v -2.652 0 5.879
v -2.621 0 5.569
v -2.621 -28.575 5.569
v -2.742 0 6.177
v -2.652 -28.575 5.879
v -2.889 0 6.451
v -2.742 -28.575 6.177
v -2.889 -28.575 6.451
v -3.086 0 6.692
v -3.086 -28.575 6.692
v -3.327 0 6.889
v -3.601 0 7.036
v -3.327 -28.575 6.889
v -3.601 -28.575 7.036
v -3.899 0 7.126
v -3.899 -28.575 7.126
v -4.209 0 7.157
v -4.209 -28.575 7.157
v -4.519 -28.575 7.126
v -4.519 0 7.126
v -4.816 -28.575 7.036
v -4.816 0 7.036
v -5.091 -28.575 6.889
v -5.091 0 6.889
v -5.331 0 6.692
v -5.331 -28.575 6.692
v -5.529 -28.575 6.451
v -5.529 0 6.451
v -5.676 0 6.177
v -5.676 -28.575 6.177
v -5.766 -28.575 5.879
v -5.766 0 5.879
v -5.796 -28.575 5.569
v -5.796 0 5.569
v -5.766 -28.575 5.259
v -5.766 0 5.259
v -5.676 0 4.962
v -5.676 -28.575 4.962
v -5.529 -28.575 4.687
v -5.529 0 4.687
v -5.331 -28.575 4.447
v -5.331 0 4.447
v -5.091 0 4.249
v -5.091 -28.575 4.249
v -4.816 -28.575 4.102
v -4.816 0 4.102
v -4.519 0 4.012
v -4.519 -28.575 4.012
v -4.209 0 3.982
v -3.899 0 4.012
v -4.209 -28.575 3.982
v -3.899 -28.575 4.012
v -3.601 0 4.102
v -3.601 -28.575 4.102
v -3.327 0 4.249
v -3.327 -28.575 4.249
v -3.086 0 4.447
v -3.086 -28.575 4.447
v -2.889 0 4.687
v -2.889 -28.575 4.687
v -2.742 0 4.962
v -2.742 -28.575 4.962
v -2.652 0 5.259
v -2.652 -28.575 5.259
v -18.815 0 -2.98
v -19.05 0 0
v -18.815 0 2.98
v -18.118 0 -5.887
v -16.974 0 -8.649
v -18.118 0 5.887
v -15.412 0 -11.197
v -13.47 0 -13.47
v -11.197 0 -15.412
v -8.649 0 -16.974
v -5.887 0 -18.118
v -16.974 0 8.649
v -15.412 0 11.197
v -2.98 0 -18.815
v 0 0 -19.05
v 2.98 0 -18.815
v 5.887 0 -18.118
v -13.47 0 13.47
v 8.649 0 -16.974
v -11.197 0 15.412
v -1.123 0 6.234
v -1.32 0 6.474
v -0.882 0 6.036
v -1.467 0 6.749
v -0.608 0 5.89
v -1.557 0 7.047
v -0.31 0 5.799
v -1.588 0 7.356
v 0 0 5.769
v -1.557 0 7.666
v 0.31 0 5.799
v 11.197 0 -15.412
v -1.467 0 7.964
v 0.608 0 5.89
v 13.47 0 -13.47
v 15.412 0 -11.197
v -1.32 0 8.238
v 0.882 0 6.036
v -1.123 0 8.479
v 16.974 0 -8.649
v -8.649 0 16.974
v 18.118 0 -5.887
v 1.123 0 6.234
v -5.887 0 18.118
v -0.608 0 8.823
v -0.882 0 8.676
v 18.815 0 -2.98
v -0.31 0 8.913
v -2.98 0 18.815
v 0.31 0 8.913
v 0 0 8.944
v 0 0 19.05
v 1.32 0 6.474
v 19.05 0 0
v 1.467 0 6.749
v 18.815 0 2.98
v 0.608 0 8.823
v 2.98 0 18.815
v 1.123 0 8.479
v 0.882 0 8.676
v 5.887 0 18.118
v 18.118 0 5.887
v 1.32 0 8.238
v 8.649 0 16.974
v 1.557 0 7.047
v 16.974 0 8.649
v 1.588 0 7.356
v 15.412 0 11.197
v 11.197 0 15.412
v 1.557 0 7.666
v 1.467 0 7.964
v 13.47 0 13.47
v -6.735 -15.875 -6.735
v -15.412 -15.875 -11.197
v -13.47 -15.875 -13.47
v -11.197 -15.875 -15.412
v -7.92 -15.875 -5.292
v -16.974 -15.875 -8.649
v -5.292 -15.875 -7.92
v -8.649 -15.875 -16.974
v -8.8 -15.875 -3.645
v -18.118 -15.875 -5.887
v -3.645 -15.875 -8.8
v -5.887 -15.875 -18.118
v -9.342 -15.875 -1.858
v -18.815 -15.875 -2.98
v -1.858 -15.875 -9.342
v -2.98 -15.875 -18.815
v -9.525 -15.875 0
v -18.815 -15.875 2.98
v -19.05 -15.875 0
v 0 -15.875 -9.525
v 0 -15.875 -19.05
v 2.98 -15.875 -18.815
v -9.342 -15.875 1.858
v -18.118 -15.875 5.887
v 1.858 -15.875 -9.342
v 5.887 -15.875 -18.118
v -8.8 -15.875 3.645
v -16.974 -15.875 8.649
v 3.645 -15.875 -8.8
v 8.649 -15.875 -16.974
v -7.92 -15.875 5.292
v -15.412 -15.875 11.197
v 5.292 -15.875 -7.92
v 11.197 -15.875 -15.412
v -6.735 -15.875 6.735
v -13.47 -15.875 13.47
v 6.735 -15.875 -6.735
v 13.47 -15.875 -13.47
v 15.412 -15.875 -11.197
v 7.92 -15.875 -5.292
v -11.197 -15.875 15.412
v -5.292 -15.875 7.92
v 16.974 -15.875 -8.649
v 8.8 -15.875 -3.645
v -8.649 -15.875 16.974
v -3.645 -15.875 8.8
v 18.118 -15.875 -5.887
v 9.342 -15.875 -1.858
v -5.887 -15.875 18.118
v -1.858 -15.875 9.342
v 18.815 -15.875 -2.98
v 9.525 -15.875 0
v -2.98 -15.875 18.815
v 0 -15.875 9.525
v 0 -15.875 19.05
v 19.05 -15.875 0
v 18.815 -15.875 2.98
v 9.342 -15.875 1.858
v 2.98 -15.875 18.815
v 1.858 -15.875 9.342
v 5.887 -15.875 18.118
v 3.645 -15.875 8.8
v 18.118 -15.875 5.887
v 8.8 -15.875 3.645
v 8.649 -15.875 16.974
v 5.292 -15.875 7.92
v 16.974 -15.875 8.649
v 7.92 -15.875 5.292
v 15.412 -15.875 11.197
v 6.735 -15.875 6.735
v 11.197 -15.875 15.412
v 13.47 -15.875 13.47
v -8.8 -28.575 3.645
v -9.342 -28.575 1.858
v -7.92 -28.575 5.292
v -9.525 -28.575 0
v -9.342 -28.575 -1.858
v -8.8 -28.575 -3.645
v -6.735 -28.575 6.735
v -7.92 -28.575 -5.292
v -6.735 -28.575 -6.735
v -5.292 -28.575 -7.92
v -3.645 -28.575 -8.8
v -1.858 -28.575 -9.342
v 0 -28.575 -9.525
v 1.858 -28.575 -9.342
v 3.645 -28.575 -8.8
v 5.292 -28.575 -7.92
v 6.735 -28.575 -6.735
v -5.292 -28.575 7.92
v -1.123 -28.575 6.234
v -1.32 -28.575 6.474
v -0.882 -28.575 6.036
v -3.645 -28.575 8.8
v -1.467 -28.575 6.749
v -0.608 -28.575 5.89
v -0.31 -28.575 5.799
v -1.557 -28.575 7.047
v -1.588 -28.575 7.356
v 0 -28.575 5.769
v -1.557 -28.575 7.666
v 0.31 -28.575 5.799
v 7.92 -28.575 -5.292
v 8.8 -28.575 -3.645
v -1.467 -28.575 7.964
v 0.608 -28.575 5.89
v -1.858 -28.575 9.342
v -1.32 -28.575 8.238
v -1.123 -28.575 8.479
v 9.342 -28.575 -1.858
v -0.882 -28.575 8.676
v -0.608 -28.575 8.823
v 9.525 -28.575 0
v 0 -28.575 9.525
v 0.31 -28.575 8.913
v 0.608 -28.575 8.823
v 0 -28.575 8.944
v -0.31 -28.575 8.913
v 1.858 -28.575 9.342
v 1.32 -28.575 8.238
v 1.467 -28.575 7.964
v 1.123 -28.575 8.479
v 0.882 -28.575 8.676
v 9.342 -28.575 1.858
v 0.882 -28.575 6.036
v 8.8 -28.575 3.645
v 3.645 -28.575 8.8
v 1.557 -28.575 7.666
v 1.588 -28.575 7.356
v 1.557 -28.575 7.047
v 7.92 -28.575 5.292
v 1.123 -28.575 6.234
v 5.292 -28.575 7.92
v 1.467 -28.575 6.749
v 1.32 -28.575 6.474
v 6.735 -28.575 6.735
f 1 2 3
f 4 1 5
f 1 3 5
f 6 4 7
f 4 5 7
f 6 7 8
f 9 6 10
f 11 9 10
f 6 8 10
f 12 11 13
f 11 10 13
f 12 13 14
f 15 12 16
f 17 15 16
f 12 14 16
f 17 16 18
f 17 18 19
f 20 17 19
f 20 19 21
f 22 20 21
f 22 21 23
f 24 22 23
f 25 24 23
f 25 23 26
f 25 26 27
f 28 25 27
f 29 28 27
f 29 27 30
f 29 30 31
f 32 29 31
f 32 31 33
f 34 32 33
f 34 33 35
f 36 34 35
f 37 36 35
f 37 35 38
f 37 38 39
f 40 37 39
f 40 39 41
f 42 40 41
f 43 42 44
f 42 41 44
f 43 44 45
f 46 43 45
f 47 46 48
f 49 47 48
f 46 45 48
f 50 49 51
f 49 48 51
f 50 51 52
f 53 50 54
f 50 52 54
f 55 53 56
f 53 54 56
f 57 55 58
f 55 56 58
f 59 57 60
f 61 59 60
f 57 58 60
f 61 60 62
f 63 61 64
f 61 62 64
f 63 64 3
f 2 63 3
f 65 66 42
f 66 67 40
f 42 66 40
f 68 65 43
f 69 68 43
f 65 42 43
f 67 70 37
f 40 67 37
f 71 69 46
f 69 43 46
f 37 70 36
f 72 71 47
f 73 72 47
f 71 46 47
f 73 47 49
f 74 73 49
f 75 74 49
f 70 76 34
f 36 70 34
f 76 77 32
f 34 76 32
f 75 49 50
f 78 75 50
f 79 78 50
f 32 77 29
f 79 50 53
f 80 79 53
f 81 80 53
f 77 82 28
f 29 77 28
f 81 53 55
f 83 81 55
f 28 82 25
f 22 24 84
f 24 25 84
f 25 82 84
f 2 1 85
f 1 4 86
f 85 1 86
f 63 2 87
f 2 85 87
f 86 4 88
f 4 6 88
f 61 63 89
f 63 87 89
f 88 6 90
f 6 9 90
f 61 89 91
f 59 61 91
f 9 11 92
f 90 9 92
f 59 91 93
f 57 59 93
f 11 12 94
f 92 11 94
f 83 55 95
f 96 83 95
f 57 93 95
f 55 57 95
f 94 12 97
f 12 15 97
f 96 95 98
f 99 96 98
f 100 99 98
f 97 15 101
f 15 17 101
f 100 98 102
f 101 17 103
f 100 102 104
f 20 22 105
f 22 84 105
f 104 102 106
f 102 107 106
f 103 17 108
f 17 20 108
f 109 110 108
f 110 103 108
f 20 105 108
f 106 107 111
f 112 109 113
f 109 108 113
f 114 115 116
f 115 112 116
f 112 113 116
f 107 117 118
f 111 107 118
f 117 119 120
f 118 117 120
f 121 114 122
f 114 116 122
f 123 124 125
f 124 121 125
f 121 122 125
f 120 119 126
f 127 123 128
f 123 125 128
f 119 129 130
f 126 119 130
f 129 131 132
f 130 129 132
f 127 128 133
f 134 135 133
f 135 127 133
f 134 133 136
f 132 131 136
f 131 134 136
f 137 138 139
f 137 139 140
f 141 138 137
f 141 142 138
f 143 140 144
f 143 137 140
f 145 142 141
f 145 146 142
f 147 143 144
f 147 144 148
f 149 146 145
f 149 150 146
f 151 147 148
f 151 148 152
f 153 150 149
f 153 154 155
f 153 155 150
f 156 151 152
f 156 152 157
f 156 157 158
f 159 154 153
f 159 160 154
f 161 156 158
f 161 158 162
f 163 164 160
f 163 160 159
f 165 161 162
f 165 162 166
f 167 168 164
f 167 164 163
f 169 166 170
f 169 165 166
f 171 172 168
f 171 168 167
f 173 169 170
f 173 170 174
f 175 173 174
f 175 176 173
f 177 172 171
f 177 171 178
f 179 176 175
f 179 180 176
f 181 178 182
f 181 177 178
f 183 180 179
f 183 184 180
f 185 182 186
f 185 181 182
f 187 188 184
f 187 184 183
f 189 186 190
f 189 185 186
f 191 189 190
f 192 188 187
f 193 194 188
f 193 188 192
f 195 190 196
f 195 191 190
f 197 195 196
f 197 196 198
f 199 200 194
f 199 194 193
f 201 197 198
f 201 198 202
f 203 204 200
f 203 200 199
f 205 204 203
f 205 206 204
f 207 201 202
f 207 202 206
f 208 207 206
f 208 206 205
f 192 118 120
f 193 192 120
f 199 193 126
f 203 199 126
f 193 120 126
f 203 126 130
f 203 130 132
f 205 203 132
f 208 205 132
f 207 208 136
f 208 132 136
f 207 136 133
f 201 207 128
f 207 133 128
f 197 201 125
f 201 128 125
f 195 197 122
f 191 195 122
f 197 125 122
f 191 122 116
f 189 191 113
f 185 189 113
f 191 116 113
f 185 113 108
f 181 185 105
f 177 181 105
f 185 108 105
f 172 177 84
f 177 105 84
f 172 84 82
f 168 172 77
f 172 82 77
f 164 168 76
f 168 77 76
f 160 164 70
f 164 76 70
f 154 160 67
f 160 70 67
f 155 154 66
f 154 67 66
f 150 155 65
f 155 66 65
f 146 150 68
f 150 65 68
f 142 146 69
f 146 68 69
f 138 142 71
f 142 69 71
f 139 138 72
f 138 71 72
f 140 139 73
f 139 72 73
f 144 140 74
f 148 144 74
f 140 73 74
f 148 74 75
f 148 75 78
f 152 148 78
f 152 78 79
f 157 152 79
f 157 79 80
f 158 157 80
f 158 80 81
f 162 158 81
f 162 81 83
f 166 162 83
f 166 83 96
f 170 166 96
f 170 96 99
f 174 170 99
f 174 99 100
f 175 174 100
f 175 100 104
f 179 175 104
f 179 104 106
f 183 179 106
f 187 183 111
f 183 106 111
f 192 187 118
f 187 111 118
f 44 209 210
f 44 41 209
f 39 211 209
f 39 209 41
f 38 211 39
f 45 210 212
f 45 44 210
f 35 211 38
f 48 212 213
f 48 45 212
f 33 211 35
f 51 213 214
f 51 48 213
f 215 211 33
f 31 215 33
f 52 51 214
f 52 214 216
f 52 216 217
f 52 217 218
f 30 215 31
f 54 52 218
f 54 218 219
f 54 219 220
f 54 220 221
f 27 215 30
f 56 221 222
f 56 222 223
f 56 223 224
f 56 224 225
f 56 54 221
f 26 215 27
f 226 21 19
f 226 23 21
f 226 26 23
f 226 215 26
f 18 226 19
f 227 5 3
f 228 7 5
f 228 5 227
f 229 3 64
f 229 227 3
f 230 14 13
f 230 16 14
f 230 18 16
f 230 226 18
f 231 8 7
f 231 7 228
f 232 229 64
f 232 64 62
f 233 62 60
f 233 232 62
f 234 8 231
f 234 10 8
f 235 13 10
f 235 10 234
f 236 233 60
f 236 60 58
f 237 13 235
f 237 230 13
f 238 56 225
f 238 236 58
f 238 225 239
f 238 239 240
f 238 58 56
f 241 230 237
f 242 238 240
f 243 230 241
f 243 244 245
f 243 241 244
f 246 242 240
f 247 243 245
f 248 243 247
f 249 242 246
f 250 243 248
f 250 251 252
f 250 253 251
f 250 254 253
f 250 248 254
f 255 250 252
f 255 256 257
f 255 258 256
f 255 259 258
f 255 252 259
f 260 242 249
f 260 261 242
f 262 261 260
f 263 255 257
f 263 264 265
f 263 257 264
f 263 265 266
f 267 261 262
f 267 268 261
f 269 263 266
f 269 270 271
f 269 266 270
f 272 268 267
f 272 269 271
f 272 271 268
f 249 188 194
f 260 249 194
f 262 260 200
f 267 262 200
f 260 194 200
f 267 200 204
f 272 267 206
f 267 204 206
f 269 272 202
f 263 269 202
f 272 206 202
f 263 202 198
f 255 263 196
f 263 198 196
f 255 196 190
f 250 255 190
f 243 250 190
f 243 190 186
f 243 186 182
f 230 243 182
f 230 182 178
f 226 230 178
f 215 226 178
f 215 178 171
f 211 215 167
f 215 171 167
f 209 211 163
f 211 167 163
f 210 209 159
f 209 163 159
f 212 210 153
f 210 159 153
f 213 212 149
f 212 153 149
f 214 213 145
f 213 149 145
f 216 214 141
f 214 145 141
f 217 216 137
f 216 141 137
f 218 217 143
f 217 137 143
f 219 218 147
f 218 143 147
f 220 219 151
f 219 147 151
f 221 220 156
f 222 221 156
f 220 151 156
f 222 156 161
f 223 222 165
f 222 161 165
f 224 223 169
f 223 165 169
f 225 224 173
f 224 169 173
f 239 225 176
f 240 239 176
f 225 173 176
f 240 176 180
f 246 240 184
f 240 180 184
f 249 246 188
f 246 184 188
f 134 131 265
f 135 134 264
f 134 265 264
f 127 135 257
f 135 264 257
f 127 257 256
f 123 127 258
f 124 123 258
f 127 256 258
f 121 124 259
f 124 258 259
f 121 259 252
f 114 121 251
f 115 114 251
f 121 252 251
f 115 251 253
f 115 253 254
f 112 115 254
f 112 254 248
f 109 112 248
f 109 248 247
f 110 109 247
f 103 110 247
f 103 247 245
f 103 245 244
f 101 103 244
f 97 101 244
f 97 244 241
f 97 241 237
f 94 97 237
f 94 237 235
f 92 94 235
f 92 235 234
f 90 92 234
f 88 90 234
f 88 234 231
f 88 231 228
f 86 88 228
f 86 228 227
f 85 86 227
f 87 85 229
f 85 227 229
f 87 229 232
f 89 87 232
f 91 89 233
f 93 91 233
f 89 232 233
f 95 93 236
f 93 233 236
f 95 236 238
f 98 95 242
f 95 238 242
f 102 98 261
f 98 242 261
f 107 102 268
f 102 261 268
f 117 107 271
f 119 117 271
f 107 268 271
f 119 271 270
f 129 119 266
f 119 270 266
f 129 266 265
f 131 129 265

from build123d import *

# Parameters (mm, degrees)
F0_R     = 19.05
F1_DEPTH = 15.875
F2_R     = 9.525
F3_DEPTH = 12.7
F4_R     = 1.5875
F5_DEPTH = 50.8
F6_R     = 1.5875
F7_DEPTH = 50.8


with BuildPart() as f1:
    # F0 (on Front) → F1 (new body)
    with BuildSketch(Plane.XZ):
        Circle(F0_R)
    extrude(amount=F1_DEPTH)

    # F2 (on face) → F3 (join)
    with BuildSketch(Plane.XZ.offset(15.875)):
        Circle(F2_R)
    extrude(amount=F3_DEPTH)

    # F4 (on face) → F5 (cut)
    with BuildSketch(Plane.XZ.offset(28.575)):
        with Locations((0, 7.356282)):
            Circle(F4_R)
    extrude(amount=-F5_DEPTH, mode=Mode.SUBTRACT)

    # F6 (on face) → F7 (cut)
    with BuildSketch(Plane.XZ.offset(28.575)):
        with Locations((-4.208875, 5.569106)):
            Circle(F6_R)
    extrude(amount=-F7_DEPTH, mode=Mode.SUBTRACT)


solid = f1.part
